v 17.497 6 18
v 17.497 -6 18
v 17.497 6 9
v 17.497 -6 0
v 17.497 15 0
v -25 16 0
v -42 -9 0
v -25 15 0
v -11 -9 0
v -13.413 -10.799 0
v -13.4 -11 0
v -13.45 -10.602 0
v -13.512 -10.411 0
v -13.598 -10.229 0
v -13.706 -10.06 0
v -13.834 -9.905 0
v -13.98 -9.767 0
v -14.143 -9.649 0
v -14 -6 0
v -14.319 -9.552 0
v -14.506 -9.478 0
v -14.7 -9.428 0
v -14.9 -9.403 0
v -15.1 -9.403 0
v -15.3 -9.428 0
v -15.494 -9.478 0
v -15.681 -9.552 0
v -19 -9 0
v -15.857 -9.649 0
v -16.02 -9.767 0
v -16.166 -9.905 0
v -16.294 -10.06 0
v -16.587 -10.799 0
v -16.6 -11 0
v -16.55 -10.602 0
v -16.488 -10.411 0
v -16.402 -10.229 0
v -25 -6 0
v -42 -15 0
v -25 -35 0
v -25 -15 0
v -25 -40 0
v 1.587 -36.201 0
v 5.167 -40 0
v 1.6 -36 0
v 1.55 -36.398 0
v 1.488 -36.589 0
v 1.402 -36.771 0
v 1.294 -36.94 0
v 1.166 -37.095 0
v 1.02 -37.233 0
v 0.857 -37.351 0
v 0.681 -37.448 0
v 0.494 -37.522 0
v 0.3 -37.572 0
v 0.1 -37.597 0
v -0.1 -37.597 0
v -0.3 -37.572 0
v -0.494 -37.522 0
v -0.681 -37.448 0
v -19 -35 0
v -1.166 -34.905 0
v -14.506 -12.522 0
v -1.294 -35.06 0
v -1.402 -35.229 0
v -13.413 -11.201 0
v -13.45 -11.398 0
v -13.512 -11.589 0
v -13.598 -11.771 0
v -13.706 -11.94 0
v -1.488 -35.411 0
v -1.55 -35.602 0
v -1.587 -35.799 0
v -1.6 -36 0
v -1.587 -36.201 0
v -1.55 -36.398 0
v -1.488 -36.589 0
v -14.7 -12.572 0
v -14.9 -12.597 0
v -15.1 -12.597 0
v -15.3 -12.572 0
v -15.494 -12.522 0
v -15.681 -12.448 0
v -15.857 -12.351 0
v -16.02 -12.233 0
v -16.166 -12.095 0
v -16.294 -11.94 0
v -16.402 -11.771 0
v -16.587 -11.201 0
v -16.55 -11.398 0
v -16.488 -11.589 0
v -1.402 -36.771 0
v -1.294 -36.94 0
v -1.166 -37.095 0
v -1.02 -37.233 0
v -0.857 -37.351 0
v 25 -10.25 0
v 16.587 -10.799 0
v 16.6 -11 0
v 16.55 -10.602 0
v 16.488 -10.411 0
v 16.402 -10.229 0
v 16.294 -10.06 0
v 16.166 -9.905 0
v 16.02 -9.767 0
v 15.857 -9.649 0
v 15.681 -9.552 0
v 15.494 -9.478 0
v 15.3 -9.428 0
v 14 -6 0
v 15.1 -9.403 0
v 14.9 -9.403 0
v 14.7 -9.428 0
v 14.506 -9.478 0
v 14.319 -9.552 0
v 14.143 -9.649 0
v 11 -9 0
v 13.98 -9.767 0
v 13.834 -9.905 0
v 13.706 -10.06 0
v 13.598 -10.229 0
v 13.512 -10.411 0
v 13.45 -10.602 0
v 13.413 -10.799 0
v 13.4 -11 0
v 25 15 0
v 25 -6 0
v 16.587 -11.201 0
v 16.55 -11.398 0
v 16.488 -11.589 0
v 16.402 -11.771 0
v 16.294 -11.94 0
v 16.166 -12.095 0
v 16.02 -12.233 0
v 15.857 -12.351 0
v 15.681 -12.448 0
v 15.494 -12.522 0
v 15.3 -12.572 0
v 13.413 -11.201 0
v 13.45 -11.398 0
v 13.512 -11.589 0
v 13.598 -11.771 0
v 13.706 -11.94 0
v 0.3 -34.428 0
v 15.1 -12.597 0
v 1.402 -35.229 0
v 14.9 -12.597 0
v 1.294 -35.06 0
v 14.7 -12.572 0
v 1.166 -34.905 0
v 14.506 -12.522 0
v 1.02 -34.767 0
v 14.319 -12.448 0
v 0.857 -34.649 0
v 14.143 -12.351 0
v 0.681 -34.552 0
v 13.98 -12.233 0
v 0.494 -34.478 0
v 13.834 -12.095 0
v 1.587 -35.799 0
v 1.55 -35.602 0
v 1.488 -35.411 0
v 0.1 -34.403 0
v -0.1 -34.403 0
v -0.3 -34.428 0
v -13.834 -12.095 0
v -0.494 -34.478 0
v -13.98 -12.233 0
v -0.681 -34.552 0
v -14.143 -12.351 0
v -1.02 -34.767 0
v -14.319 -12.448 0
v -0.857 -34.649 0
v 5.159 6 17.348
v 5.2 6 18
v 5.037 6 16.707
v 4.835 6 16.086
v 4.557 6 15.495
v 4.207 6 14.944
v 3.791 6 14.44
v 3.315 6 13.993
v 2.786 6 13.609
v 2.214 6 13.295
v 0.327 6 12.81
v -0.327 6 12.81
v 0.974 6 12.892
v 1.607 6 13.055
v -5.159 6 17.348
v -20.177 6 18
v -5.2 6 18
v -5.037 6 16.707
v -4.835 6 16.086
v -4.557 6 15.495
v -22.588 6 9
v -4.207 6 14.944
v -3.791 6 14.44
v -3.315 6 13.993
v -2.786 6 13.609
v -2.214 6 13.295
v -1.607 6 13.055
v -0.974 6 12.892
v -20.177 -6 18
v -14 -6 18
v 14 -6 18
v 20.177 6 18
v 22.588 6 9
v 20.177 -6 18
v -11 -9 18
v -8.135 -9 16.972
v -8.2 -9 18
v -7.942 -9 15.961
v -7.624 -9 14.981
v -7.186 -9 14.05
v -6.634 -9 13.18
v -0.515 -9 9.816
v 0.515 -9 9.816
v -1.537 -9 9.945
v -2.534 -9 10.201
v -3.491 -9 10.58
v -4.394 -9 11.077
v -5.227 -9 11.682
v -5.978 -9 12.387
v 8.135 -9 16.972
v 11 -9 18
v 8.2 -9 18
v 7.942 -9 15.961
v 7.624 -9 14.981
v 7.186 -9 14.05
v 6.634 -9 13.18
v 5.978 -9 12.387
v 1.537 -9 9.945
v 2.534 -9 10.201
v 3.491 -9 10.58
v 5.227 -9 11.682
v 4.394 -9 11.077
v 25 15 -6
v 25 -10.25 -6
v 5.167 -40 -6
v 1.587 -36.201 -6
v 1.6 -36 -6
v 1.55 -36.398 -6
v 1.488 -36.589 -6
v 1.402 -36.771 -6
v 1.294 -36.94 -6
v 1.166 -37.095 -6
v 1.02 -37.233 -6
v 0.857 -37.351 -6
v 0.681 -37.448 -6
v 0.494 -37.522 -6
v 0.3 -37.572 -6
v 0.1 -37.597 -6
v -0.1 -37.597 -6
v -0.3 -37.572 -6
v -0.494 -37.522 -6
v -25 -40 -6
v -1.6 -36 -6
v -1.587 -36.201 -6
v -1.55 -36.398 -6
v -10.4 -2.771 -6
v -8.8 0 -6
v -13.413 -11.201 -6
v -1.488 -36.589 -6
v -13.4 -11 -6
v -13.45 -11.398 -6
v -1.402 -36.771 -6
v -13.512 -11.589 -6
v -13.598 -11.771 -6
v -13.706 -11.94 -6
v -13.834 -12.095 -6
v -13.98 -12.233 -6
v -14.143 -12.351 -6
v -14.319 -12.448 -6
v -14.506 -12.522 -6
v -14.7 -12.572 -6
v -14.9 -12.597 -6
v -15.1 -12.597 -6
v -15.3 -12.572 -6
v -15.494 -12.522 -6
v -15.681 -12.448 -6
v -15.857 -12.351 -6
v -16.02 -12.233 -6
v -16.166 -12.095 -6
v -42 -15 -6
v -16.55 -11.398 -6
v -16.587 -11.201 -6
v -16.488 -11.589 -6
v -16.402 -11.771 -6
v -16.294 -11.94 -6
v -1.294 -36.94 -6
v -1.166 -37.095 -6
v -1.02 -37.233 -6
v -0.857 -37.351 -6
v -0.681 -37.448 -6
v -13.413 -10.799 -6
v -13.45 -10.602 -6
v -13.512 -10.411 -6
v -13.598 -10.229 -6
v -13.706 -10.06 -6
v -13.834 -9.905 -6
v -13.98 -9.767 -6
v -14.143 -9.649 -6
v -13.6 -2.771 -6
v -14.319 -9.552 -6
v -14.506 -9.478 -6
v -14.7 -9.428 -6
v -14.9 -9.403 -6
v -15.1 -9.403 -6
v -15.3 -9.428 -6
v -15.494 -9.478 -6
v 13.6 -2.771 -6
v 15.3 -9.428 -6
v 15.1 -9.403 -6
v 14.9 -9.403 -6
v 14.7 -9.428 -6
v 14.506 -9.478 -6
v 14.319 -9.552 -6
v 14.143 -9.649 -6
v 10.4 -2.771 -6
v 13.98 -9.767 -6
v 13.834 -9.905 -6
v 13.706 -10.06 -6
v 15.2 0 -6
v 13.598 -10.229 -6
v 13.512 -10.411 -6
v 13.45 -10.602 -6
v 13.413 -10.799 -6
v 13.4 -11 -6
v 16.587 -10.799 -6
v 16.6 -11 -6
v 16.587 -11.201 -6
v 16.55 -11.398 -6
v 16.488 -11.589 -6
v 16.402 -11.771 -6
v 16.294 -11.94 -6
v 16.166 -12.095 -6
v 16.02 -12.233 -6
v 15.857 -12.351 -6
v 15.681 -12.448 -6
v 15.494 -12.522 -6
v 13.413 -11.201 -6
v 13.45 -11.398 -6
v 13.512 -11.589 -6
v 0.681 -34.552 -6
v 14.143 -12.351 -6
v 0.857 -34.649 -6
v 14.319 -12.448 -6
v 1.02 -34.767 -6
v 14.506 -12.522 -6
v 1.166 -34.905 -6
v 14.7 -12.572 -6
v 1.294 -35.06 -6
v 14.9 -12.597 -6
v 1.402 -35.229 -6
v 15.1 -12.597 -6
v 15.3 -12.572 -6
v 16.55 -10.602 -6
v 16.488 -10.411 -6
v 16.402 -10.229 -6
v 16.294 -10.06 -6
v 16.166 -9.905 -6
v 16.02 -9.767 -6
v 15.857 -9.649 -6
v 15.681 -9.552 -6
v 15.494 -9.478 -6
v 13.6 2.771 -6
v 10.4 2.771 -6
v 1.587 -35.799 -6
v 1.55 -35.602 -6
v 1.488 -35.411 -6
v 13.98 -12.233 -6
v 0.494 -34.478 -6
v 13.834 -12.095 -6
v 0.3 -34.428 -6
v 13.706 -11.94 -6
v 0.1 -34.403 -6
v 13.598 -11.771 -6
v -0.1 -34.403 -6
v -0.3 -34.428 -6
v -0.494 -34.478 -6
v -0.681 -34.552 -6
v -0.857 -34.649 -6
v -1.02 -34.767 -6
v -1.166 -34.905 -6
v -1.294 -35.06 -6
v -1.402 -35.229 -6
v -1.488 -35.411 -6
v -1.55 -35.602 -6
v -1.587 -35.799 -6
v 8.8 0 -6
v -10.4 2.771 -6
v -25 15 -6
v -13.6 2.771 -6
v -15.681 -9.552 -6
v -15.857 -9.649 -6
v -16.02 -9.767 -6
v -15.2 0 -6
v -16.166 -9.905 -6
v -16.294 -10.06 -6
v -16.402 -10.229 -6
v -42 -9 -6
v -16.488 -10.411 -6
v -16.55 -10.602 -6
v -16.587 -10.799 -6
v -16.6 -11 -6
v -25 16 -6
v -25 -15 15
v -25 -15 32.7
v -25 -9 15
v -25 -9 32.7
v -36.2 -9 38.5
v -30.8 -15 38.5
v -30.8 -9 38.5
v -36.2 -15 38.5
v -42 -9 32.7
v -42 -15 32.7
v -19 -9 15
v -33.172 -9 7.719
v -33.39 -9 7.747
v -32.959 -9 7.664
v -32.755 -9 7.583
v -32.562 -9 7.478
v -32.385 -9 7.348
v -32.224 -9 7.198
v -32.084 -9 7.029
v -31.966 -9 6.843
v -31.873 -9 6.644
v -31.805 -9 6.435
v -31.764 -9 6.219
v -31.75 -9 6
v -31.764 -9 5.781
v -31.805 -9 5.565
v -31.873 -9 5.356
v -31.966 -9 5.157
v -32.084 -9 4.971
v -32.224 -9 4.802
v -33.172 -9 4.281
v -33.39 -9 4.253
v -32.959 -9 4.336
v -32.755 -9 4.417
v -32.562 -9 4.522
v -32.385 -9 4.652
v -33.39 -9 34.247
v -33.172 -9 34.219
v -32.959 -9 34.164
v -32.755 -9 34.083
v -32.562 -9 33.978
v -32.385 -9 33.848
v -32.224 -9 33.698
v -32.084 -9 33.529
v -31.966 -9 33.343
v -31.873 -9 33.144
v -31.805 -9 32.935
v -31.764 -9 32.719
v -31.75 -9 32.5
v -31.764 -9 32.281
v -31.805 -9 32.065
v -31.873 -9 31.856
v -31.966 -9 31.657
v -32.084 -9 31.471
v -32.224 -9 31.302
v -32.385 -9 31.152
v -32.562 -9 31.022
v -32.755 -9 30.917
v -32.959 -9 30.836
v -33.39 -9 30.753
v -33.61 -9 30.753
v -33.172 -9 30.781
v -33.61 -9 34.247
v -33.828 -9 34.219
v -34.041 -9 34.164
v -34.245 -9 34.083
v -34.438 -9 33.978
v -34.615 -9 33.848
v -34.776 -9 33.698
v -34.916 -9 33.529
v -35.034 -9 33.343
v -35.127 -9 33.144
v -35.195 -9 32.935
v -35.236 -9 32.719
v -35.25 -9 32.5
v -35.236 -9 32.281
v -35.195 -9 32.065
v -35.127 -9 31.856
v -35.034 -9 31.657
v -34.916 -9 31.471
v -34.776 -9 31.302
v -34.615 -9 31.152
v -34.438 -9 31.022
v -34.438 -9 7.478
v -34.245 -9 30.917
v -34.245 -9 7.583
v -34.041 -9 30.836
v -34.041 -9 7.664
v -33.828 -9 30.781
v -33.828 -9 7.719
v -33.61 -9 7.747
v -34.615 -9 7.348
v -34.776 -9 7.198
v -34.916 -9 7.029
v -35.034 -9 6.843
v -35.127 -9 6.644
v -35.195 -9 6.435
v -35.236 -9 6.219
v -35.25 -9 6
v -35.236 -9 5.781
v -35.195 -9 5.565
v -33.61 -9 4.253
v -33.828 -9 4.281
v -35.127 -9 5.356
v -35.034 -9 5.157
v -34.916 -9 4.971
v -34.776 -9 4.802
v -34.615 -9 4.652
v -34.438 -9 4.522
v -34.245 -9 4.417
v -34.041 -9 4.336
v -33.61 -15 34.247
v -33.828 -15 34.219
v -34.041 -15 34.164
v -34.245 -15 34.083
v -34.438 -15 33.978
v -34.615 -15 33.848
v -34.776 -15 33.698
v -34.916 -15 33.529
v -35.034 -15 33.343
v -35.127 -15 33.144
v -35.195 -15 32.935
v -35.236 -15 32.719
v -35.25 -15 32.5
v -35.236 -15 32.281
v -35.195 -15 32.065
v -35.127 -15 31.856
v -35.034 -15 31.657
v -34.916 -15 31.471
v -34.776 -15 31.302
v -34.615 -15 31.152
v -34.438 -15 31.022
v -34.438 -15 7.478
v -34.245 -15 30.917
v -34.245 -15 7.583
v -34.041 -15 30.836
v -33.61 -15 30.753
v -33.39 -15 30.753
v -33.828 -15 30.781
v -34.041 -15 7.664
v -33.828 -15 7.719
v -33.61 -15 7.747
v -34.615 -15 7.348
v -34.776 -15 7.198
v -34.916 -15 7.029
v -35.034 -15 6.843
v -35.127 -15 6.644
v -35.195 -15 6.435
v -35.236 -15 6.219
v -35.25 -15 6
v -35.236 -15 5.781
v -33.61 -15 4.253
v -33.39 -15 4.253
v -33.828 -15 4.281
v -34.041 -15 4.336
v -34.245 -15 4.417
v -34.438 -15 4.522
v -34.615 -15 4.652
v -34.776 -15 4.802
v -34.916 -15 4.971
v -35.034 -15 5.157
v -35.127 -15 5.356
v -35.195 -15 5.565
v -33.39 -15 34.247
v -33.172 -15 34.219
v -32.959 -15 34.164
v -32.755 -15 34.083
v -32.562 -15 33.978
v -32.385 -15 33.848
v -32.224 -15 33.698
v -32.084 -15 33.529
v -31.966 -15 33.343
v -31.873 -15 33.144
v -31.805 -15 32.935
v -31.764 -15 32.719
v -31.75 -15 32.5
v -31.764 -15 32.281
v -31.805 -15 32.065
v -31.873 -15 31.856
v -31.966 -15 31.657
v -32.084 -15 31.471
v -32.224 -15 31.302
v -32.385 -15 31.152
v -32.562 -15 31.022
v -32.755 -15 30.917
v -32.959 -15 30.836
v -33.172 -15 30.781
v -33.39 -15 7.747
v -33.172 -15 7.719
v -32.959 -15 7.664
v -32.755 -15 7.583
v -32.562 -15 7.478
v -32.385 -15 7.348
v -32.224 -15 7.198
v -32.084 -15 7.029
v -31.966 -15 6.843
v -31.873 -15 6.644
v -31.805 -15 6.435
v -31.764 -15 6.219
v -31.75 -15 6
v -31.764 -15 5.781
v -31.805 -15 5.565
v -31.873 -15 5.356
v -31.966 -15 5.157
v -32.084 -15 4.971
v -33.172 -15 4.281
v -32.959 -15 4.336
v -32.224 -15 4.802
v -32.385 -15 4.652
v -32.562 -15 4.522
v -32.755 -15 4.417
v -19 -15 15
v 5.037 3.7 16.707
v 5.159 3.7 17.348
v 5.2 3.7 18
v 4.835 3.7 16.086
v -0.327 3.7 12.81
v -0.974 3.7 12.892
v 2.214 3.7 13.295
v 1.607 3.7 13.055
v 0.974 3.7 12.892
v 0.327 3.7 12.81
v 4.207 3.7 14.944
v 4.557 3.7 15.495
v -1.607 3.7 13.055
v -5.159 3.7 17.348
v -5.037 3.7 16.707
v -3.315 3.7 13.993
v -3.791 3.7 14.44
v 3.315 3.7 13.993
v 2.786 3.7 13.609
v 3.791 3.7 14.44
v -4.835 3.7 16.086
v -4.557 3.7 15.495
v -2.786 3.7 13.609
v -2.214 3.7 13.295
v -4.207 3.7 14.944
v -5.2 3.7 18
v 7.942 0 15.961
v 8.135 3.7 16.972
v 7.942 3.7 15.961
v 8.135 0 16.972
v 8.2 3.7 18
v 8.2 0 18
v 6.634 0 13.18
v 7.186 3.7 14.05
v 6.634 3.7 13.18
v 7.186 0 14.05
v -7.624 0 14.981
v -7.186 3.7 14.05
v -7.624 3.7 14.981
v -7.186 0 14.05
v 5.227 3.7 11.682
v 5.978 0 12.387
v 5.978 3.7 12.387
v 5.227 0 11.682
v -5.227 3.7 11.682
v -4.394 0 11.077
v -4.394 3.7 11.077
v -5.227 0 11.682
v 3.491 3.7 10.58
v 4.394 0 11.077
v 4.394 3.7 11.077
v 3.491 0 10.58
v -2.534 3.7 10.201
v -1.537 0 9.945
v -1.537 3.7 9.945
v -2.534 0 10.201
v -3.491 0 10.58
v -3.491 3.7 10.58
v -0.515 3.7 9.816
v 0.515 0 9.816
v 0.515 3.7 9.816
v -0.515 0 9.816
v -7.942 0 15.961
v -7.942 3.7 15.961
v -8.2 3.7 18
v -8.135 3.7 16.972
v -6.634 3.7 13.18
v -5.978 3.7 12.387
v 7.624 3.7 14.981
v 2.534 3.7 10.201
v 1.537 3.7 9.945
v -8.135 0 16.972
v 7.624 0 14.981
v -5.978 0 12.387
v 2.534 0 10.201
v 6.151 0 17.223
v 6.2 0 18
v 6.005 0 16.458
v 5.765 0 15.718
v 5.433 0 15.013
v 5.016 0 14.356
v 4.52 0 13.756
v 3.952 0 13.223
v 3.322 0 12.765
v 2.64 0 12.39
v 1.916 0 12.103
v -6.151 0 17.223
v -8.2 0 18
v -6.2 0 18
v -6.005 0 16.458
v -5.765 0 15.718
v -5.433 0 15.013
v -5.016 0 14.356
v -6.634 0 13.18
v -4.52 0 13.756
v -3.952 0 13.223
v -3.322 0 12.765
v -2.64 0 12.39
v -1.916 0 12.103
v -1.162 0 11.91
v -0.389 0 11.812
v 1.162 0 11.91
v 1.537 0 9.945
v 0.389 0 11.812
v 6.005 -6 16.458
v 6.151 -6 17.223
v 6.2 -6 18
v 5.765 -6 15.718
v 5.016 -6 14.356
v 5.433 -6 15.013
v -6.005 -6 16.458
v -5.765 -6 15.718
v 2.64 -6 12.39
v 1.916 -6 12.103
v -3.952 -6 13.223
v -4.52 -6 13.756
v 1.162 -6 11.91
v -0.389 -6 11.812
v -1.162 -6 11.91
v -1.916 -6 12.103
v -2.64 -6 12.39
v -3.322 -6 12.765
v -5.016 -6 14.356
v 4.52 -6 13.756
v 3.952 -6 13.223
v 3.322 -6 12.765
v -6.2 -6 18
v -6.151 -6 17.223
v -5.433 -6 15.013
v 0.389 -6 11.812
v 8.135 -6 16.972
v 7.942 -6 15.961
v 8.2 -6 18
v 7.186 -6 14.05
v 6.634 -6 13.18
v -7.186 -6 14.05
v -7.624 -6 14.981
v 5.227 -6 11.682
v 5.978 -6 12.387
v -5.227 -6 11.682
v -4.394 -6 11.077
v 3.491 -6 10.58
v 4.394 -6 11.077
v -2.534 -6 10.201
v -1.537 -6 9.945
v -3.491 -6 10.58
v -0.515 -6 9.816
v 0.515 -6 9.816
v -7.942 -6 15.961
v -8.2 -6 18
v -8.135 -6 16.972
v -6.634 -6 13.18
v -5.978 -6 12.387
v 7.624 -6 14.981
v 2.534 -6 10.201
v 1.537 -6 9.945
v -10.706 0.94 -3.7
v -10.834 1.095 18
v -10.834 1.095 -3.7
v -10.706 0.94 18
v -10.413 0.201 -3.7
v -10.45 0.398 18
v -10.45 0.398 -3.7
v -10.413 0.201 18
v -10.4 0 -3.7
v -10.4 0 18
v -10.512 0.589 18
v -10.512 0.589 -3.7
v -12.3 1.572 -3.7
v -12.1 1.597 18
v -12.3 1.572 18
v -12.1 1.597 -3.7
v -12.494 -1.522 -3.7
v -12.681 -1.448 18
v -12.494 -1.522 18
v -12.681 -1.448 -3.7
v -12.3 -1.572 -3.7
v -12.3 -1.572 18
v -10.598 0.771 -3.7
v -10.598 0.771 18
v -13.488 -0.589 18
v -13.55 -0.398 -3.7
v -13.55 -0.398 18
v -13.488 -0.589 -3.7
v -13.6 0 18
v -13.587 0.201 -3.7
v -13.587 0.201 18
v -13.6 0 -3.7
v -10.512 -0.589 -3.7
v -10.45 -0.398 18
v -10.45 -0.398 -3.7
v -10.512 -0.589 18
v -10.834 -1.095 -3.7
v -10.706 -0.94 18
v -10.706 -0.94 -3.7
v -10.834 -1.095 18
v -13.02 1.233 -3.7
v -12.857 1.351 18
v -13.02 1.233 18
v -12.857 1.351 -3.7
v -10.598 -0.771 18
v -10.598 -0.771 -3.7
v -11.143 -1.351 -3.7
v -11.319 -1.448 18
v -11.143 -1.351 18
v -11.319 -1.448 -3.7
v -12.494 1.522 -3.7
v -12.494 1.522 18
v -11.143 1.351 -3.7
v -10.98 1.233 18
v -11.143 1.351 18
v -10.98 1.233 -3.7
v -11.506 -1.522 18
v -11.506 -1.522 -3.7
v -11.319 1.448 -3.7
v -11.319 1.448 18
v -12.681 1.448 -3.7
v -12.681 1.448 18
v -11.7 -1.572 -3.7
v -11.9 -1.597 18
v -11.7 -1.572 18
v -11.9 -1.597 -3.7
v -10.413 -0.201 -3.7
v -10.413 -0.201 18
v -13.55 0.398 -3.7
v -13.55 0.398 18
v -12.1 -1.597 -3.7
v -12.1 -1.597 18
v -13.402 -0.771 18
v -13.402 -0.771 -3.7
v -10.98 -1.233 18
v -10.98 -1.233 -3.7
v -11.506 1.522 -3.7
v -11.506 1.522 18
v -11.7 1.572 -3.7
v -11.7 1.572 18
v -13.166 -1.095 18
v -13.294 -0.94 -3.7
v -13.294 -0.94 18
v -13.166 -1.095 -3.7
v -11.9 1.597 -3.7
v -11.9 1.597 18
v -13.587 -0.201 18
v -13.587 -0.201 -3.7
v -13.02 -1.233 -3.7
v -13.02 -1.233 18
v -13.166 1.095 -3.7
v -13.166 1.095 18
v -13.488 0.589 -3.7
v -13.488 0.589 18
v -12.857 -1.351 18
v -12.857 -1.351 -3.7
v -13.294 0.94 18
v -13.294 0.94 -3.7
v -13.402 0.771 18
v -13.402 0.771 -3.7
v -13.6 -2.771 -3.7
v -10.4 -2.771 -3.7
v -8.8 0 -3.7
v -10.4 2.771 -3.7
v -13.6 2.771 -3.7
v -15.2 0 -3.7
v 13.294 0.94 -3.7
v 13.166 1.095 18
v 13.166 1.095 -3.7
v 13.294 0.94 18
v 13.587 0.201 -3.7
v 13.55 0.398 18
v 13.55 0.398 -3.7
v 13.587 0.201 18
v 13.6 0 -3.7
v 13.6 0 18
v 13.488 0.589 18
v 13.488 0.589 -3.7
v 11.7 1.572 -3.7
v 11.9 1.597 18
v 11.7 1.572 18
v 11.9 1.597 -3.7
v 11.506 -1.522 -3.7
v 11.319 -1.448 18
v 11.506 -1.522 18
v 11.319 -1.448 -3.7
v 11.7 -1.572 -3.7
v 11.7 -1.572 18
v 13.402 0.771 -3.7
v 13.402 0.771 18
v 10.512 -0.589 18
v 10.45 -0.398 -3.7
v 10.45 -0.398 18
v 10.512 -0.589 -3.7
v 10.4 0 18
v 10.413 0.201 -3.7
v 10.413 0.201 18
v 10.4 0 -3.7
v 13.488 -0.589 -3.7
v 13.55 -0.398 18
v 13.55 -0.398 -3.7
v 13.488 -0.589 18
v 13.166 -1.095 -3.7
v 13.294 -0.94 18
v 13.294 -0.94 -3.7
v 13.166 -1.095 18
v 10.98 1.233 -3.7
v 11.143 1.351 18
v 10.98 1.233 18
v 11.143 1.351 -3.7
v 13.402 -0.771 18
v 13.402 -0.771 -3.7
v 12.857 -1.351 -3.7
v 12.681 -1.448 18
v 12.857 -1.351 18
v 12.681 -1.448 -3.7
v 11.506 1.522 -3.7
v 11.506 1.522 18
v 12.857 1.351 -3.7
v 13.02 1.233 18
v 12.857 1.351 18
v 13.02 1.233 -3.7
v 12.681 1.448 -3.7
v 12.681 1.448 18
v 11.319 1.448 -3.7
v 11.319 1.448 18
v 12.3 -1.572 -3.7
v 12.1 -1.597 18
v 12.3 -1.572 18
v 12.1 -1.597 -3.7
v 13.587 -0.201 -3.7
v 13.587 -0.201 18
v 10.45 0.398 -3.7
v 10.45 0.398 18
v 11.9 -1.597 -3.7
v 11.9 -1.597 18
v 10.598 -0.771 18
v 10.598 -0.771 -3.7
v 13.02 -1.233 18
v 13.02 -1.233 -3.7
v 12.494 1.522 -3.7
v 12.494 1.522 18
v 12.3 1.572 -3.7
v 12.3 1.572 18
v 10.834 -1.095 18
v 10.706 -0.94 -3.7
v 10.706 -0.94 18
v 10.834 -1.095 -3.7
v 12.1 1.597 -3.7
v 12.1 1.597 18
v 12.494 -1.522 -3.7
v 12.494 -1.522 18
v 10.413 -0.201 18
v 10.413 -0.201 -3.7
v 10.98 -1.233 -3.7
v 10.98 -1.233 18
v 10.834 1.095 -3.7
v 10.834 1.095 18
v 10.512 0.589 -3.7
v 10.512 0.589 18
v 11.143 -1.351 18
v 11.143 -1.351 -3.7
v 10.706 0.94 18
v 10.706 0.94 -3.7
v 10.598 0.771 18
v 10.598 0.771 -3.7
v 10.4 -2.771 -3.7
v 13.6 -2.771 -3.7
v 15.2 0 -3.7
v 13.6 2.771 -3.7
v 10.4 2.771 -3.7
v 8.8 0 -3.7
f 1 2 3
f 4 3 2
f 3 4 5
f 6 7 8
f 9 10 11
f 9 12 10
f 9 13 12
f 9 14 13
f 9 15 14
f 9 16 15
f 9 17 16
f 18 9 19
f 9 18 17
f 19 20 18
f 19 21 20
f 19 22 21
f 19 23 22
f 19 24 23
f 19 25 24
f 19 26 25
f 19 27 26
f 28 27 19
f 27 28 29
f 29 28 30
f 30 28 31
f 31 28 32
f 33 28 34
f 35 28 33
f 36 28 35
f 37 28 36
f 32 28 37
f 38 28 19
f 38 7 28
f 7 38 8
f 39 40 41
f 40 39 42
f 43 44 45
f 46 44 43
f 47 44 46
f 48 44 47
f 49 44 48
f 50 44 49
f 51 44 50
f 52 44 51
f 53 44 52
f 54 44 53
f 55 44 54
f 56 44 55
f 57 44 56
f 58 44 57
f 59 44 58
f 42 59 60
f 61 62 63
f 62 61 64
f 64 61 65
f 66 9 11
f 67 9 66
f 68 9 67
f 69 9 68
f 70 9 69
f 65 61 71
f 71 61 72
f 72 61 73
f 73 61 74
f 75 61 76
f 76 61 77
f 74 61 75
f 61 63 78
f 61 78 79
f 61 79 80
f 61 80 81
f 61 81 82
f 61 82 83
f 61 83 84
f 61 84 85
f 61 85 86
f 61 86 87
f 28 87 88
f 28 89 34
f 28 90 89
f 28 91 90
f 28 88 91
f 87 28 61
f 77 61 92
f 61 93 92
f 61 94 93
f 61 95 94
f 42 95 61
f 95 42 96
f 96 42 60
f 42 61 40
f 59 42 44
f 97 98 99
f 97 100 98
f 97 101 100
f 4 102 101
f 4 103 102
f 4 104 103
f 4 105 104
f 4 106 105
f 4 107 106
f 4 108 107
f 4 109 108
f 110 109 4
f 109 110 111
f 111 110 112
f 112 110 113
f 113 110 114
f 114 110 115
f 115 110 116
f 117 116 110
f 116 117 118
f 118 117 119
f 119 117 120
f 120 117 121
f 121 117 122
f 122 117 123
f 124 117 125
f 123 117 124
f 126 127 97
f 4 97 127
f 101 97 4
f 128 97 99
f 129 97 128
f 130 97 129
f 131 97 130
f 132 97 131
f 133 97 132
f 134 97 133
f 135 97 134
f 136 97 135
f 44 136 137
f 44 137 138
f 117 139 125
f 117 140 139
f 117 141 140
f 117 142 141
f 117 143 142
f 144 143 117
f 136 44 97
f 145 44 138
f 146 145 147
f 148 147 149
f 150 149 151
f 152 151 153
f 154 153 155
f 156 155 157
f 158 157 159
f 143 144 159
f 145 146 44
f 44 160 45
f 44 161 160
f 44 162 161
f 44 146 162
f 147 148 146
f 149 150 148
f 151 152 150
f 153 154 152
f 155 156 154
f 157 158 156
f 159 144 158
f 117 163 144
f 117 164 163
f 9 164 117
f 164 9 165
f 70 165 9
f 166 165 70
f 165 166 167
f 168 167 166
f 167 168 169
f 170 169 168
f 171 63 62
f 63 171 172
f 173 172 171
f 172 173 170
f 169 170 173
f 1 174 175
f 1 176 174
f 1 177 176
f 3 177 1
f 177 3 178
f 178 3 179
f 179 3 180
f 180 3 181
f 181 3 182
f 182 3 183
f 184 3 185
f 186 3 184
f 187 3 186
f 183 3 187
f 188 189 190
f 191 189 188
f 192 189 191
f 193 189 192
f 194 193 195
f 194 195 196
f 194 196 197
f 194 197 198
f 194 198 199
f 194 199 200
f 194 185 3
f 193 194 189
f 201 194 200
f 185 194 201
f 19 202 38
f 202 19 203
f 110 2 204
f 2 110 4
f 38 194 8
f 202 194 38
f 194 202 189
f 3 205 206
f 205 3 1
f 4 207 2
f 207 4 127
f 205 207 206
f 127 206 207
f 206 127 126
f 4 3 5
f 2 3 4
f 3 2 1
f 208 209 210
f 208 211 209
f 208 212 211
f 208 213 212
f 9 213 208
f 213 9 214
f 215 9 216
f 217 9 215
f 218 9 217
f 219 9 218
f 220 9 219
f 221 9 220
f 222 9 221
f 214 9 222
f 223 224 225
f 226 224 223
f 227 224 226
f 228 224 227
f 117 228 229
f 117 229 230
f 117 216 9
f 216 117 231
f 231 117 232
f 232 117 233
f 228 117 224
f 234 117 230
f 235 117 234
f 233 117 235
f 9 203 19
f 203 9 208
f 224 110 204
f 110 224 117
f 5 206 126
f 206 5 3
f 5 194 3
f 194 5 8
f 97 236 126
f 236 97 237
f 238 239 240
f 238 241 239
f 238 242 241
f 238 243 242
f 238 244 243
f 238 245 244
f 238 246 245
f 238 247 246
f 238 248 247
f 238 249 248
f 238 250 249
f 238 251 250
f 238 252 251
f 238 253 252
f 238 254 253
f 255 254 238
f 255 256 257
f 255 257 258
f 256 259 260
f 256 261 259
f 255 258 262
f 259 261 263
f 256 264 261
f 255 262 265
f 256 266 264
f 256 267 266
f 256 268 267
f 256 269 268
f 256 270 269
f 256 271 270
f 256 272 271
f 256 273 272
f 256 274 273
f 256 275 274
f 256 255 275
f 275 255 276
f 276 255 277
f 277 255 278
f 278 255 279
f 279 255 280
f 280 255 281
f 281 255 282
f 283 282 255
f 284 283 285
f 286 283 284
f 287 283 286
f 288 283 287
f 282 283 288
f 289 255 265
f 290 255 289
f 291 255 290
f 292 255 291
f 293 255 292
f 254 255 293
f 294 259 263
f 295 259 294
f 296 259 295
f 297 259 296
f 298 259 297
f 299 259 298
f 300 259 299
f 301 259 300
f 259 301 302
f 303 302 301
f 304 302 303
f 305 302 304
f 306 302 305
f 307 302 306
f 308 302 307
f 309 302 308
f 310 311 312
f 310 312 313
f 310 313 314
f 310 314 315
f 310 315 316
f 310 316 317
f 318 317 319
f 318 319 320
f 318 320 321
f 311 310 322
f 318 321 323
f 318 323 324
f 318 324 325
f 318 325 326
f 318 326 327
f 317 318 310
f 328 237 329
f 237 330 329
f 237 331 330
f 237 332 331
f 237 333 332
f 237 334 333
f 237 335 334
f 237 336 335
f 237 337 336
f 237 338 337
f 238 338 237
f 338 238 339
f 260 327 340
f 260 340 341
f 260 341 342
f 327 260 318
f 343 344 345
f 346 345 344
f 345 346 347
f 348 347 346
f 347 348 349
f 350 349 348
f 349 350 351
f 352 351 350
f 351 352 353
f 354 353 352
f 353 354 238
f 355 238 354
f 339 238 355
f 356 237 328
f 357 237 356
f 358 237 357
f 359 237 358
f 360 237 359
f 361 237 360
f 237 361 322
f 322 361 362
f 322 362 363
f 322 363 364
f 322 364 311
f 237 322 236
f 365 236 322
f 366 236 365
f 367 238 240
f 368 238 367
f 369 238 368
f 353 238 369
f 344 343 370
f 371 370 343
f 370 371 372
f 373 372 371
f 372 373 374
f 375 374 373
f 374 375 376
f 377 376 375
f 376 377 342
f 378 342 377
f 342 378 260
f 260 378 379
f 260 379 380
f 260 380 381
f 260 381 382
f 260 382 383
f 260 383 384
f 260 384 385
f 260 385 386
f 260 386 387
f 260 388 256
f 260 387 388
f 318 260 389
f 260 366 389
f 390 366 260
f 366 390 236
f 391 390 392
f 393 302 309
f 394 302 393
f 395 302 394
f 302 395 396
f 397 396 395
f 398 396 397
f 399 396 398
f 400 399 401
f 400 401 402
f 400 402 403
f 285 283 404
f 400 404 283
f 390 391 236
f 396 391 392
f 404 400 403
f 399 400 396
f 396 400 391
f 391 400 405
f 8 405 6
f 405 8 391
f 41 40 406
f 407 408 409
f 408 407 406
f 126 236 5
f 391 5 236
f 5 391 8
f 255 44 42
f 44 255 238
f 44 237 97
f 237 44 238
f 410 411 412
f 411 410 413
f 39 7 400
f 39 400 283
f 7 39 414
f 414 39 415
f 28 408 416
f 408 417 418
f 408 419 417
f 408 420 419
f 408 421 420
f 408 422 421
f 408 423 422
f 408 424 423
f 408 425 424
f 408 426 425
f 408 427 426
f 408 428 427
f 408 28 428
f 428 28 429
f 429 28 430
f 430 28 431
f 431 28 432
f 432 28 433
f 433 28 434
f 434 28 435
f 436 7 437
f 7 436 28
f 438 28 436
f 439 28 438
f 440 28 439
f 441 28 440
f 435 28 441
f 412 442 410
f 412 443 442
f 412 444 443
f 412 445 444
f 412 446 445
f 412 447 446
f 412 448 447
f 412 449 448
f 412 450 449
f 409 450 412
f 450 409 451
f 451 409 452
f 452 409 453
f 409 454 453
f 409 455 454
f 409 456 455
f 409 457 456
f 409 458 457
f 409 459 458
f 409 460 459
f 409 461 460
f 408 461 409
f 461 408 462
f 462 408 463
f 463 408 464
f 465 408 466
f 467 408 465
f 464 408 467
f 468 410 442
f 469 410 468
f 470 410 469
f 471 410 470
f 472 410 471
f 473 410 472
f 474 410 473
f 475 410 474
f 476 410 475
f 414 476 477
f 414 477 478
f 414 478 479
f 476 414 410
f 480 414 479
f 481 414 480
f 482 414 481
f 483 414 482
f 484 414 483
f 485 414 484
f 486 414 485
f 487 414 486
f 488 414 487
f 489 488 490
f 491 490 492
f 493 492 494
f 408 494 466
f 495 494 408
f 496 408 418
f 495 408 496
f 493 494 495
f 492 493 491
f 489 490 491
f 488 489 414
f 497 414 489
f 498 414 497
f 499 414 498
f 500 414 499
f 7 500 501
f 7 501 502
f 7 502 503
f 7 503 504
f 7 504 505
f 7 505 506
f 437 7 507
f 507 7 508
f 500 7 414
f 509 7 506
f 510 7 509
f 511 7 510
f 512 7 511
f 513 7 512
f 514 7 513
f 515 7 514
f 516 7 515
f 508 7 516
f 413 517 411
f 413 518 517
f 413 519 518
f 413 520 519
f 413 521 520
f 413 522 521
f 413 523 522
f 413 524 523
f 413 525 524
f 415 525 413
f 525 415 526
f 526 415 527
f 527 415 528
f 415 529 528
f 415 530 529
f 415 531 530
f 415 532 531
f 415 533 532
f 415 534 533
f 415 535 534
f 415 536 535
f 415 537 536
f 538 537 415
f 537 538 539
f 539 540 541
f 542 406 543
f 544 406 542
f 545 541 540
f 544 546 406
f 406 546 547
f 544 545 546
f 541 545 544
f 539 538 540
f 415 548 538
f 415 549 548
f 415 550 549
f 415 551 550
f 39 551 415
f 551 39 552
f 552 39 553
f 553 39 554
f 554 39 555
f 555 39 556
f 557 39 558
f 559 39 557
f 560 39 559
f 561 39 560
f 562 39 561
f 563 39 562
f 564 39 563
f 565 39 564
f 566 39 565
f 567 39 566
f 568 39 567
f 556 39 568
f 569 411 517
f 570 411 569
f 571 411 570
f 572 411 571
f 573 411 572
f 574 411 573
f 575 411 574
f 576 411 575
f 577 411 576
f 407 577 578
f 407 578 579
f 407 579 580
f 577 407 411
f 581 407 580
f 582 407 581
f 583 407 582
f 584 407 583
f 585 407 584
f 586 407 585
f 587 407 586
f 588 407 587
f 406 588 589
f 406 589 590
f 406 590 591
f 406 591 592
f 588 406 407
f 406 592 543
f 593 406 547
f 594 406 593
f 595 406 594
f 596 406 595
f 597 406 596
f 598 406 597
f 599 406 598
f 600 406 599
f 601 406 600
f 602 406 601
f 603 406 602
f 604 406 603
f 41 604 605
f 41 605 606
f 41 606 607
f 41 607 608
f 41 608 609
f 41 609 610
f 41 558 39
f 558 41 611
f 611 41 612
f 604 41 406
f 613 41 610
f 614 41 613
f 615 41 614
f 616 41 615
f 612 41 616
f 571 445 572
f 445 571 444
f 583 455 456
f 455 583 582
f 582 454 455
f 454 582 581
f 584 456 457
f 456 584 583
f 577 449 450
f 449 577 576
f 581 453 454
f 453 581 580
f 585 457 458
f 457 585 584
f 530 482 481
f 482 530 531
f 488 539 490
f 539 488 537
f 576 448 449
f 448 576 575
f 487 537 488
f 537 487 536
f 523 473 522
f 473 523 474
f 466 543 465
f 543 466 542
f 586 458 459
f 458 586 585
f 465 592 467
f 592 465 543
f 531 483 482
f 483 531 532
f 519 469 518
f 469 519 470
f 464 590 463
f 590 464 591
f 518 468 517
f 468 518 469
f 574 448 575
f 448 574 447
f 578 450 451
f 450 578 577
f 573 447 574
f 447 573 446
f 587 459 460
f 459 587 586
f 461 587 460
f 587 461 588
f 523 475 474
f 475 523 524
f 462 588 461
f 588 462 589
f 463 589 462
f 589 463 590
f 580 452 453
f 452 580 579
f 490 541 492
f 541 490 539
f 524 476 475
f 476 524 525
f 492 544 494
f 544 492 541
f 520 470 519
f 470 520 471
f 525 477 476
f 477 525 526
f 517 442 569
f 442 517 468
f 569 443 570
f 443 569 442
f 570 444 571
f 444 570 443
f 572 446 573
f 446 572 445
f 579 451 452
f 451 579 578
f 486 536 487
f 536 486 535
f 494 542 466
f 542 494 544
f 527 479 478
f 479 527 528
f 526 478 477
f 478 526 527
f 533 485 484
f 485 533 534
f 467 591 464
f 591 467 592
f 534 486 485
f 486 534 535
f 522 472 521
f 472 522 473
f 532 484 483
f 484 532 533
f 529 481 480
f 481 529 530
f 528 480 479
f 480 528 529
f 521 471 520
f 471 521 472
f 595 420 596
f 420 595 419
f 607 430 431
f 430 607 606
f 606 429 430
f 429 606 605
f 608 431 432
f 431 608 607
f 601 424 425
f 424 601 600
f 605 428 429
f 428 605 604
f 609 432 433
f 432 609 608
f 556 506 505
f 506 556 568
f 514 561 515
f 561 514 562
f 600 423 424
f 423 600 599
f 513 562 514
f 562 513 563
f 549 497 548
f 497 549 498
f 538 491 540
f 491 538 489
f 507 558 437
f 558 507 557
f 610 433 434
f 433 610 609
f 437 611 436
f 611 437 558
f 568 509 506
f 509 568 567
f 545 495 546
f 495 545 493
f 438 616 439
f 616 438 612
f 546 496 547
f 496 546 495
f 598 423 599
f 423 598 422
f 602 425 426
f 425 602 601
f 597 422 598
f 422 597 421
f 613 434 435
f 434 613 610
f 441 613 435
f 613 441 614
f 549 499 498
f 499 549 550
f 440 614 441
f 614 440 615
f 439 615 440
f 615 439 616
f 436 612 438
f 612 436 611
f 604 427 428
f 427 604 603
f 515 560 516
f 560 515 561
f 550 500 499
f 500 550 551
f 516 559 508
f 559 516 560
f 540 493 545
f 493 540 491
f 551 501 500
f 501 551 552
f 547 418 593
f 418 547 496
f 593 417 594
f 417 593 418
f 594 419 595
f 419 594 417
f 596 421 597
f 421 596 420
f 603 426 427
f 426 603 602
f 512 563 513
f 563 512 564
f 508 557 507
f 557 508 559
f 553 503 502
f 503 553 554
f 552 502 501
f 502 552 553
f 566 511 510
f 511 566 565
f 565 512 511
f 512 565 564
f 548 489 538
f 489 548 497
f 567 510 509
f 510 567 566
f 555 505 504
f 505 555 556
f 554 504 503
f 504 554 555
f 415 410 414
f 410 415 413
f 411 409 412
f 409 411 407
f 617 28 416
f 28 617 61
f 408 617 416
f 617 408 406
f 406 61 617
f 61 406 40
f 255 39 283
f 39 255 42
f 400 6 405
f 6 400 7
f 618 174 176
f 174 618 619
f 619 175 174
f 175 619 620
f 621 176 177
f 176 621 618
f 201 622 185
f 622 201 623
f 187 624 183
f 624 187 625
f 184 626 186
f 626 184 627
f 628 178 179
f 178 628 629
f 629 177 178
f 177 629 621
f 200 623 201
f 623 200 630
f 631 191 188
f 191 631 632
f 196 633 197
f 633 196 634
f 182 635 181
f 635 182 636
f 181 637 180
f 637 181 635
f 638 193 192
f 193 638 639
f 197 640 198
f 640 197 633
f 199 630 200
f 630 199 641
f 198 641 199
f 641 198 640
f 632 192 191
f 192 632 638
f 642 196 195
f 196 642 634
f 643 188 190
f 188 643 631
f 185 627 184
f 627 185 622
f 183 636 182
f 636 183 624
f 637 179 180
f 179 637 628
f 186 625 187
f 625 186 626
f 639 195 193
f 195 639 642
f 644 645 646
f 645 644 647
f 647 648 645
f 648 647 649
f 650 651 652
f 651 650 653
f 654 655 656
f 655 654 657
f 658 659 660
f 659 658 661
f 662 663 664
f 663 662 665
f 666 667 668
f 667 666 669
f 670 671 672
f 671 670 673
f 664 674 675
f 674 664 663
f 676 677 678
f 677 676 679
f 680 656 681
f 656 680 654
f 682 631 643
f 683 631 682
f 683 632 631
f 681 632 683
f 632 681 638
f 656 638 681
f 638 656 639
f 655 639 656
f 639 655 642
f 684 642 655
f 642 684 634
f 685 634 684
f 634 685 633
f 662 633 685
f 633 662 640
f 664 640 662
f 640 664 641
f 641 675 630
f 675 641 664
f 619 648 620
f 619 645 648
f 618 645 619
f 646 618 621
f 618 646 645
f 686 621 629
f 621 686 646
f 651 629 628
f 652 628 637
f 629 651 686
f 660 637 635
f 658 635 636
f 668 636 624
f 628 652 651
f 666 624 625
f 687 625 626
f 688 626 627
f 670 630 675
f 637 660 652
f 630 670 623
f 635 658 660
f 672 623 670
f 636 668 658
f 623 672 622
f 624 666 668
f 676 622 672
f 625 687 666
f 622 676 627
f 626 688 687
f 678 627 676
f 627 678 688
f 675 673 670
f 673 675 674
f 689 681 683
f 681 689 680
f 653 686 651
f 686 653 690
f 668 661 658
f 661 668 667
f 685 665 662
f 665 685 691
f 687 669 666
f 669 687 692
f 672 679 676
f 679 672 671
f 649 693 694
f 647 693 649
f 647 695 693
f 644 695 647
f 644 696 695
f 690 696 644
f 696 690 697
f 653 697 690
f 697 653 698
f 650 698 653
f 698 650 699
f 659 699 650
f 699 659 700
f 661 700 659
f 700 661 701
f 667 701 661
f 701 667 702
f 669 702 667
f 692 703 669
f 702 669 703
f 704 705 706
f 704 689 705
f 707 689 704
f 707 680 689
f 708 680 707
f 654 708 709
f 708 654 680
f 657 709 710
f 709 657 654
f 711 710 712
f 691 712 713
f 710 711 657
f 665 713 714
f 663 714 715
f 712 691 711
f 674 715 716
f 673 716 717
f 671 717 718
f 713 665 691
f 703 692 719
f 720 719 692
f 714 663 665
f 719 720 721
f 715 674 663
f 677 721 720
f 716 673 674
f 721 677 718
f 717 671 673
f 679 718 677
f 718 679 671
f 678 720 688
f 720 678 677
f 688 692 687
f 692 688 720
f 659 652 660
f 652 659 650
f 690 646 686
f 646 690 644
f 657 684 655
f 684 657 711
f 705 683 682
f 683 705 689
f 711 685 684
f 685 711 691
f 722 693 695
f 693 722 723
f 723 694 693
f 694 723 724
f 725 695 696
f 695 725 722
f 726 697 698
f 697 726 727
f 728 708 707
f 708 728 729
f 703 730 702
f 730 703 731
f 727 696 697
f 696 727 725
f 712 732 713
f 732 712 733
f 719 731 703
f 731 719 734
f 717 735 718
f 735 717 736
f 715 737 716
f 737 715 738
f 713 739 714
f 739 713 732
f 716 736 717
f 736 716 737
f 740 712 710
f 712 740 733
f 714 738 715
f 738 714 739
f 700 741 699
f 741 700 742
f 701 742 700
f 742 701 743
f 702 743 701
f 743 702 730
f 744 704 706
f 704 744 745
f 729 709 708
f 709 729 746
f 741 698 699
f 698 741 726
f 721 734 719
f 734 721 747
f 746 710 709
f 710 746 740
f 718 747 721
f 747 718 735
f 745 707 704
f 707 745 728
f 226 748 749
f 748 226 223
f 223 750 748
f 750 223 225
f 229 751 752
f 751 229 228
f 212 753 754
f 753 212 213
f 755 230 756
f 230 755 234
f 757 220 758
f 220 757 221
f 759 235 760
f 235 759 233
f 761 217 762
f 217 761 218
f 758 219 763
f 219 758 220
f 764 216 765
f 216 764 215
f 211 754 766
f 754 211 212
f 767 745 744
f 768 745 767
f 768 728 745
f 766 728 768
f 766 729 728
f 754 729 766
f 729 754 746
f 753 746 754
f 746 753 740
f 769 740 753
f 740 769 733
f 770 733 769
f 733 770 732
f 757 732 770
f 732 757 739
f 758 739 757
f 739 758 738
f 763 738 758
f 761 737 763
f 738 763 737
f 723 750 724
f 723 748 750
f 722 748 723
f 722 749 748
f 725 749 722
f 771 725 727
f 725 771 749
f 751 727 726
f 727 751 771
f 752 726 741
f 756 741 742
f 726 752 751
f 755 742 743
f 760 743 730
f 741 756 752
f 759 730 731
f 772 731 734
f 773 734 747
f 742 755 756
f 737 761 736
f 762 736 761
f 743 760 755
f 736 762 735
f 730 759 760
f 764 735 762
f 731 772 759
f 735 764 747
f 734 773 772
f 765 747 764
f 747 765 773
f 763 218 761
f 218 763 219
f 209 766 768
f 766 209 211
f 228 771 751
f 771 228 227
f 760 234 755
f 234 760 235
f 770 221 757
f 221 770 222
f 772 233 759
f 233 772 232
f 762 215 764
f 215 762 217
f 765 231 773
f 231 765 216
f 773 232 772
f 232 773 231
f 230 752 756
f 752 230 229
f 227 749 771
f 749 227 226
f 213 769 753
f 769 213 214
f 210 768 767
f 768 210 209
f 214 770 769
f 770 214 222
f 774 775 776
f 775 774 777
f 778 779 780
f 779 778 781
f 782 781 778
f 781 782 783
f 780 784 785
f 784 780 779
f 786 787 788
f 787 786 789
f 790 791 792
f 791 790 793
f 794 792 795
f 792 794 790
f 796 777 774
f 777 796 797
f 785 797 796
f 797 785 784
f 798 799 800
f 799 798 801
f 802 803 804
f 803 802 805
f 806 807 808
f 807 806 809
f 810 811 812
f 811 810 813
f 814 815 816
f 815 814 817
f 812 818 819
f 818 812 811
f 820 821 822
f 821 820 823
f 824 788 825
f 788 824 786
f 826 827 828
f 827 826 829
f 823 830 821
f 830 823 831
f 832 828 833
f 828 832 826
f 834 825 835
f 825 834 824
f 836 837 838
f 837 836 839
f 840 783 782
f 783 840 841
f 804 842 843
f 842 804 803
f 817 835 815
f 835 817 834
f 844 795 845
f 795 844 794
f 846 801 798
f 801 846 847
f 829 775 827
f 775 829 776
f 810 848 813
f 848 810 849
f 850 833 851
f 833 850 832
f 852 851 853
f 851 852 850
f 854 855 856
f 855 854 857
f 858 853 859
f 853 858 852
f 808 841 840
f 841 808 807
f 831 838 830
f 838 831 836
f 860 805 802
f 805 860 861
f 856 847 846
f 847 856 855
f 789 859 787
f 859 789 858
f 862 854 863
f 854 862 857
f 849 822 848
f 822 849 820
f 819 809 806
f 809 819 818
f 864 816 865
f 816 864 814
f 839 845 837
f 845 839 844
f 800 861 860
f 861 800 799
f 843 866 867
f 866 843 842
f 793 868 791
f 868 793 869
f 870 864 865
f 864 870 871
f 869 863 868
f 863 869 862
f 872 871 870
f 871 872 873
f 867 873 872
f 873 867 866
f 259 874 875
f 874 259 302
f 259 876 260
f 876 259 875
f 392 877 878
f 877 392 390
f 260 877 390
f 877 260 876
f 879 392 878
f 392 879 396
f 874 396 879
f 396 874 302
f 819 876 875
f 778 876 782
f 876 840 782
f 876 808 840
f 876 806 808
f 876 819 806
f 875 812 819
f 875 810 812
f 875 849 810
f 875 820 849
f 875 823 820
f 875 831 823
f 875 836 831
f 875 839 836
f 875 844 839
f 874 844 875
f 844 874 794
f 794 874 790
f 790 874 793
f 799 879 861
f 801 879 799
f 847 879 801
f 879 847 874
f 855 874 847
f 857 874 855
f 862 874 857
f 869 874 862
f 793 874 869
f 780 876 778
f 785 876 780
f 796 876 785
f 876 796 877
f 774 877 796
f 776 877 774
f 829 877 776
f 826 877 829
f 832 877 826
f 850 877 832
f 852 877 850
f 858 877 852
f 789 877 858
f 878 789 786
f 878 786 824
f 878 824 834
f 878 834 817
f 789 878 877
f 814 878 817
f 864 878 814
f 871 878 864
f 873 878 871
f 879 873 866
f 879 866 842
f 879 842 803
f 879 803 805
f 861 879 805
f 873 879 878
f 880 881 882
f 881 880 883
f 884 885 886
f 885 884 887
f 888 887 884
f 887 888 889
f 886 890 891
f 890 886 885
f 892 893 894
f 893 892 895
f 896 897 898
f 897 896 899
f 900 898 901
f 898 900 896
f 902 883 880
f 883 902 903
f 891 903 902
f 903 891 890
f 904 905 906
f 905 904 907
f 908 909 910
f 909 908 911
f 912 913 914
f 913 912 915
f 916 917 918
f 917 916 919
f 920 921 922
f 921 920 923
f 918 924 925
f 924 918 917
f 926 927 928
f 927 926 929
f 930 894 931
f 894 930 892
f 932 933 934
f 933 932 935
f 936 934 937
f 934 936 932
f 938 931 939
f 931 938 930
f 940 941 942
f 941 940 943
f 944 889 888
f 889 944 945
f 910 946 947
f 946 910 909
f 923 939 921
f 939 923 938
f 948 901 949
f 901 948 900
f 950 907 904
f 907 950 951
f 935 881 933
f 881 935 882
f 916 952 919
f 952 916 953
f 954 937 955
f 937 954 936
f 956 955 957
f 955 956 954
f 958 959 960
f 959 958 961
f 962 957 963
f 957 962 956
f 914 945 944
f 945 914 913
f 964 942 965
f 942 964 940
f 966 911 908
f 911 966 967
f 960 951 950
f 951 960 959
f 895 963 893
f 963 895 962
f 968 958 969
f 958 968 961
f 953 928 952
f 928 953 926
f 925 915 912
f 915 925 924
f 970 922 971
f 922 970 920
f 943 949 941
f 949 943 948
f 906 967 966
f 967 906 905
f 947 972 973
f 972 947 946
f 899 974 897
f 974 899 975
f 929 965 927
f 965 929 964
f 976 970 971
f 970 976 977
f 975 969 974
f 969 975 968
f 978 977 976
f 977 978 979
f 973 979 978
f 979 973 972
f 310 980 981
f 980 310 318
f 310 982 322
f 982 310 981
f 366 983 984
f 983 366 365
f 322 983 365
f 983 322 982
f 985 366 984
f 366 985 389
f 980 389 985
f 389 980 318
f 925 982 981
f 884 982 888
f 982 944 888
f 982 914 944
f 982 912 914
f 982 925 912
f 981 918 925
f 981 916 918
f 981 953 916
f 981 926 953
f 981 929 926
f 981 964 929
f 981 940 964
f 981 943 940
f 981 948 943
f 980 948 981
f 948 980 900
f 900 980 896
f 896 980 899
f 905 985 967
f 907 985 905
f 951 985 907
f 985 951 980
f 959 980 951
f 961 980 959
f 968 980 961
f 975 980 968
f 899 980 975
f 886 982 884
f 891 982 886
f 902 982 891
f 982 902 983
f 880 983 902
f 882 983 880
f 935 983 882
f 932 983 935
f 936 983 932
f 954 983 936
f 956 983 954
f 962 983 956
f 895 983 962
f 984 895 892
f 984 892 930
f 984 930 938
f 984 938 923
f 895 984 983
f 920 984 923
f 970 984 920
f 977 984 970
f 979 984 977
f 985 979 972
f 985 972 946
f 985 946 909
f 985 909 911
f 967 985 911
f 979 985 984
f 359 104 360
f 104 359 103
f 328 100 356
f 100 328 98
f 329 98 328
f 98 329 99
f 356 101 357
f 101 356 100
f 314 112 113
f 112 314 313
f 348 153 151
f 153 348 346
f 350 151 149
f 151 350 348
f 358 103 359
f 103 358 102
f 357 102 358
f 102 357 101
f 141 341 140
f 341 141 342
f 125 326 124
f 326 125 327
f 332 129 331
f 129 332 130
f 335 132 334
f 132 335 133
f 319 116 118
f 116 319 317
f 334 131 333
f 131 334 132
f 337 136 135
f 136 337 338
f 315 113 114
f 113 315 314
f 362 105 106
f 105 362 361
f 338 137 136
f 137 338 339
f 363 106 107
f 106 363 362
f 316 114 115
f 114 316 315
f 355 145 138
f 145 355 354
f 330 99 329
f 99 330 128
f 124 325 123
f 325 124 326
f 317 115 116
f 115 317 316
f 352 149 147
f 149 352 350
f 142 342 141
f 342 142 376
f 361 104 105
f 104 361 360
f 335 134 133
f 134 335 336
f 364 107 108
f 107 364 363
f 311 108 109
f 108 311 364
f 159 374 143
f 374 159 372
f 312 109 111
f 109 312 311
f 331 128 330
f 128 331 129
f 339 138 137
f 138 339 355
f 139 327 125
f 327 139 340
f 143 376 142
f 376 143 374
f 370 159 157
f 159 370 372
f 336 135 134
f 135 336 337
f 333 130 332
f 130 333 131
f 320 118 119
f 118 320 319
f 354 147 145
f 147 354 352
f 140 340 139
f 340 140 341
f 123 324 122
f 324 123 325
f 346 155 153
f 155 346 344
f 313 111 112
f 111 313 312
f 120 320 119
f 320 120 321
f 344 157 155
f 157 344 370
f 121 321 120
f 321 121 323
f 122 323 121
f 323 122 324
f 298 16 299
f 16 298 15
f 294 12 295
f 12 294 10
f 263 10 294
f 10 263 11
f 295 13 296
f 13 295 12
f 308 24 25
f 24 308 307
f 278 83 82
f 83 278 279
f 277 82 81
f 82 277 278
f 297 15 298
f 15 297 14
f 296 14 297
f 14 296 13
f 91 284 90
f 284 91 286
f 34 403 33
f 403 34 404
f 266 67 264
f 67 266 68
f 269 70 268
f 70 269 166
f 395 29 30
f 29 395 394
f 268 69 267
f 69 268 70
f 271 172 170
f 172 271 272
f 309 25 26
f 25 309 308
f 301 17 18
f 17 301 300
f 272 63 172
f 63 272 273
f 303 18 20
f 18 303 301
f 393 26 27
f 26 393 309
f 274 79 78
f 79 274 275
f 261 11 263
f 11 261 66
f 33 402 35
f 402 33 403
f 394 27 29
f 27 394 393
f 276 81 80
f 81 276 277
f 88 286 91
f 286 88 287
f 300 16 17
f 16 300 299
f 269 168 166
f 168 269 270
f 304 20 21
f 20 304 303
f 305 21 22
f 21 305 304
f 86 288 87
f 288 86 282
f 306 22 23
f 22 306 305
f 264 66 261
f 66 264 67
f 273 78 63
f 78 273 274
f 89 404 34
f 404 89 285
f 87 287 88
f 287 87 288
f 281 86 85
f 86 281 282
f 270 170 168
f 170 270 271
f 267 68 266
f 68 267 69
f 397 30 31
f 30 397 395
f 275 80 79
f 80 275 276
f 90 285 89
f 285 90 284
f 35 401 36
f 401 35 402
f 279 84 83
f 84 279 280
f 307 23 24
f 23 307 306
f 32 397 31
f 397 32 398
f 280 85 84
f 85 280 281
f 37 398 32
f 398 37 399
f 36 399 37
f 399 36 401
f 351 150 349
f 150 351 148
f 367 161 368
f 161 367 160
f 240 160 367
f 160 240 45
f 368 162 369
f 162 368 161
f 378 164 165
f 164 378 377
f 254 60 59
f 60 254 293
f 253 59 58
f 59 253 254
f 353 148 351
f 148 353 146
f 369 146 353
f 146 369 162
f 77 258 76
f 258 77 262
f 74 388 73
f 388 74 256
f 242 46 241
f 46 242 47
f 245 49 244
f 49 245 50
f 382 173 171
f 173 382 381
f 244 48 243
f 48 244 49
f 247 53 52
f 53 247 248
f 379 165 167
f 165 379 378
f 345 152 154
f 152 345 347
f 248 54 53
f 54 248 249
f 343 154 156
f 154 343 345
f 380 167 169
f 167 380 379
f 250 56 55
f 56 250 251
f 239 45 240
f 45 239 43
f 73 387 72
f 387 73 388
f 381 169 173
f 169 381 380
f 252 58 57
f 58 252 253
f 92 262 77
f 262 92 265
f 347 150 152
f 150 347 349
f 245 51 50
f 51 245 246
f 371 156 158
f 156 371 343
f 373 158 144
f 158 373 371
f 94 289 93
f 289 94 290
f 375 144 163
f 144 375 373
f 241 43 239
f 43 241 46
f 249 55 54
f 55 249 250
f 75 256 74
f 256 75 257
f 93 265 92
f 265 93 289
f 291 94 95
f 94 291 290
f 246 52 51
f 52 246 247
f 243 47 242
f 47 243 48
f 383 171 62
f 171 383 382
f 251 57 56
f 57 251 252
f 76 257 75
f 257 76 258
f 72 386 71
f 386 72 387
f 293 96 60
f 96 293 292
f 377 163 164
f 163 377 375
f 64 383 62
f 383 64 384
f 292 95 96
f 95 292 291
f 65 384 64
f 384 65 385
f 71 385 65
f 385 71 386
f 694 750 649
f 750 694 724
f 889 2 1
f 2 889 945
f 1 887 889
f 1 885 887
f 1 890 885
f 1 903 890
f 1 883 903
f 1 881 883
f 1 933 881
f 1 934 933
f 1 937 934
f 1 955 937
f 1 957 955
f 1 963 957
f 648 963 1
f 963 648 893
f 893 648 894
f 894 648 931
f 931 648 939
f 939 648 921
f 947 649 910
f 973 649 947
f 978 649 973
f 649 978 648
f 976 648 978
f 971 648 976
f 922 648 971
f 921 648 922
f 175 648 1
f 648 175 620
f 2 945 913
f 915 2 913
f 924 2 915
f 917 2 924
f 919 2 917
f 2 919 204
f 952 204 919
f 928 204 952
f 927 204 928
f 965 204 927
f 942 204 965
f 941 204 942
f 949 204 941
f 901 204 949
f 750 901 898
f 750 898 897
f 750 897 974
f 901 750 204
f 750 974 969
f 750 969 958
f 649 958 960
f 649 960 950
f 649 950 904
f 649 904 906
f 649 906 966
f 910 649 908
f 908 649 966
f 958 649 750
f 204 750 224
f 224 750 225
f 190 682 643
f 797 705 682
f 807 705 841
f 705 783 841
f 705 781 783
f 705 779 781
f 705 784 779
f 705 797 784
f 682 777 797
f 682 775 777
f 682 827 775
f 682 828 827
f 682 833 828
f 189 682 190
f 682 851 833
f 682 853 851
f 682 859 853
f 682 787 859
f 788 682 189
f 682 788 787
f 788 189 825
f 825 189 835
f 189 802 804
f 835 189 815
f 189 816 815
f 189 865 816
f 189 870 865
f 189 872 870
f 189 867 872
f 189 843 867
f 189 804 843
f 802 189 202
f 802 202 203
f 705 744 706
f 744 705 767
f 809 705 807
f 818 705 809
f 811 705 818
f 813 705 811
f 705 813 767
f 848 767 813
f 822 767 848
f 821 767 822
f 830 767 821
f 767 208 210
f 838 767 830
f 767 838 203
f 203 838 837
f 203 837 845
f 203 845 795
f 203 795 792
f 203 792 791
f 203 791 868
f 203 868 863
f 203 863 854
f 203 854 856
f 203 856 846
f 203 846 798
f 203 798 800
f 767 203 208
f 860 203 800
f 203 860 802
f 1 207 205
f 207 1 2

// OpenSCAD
//head
include <MCAD/nuts_and_bolts.scad>;
$fn=50;
mode=1; //0-full 1-base part 2-clamp
extruder=0;  // 0 - model 1-additivities
oversize=0.2;
hole_height=18;
bltouch_hole=3.5;
bltouch_w=11+6;
bltouch_l=26.5+12;
bltouch_dist=14.4+bltouch_hole;
//subs
module prism(l, w, h) {
	translate([0, l, 0]) rotate( a= [90, 0, 0]) 
	linear_extrude(height = l) polygon(points = [
		[0, 0],
		[w, 0],
		[0, h]
	], paths=[[0,1,2,0]]);
}
module trapeze(w1,w2,d,h){
    down=min(w1,w2);
    low=abs(w1-w2)/2;
    translate([down/-2,d/-2,0]){
        cube([down,d,h]);
        prism(d,-low,h);
    }
    translate([down/2,d/-2,0])prism(d,low,h);
}

//hotend
module head_hole(cap=5){
    translate([0,0,3+6+3.7-0.1])cylinder(5,r=cap+oversize);
    translate([0,0,3+6])cylinder(3.7,r=8+oversize);
    translate([0,0,3-0.1])cylinder(6.0+0.2,r=6+oversize);
    translate([0,0,-0.1])cylinder(3.0+0.1,r=8+oversize);
}
module detector_clamp(){
    plate=26;
    translate([0,25,6])cube([6,6,15]);
    //translate([-3,0,plate])prism(6,6,6);
    //translate([6,25,6])prism(6,10,15);
    translate([0,25,6])rotate([0,0,-90,0])prism(6,20,15);
    translate([0,25,0])rotate([90,0,0])prism(6,-bltouch_w,25);
    translate([0,25+6,0])rotate([90,0,180])prism(6,bltouch_w,25);
    // CLAMP
    translate([-bltouch_w,25,0])difference(){
        cube([bltouch_w,6,6+bltouch_l]);
        //bltouch
        translate([bltouch_w/2,-0.1,bltouch_l])rotate([-90,0,0])cylinder(6.2,d=bltouch_hole);
        translate([bltouch_w/2,-0.1,12])rotate([-90,0,0])cylinder(6.2,d=bltouch_hole);
        
        //side cuts        
        translate([-0.1,-0.1,6+bltouch_l+0.1])rotate([0,90,0])prism(6.2,6,6);
        translate([bltouch_w+0.1,-0.1,6+bltouch_l+0.1])rotate([0,180,0])prism(6.2,6,6);
    }
}
module full (){
    h=28;
    w=50;
    base=11;
    plate=55;
difference(){
    union(){
        trapeze(w,w-2*h*tan(15),12,h);
        translate([0,12/-2,h/2])rotate([90,0,0])trapeze(22+3*2,22,h,3);
        translate([0,6,0])
            intersection(){
                rotate([0,0,90])translate([0,-w/2,0])prism(w,9,9);
                translate([0,9/2,0])trapeze(w,w-2*h*tan(15),9,h);
            }
        //plate
        translate([-w/2,-plate+9+6,-6])
         {
          difference(){
            cube([w,plate,6]);
            translate([w+0.1,-0.1,-0.1])rotate([90,0,180])prism(6.2,20,30);
          }
          detector_clamp();
        }
    }
    translate([0,-9,hole_height])rotate([-90,0,0])head_hole(5);
    
    for (s=[-12,12]){
        translate([s,0,-6-0.1]){ cylinder(h+6,r=1.6); nutHole(3); }
        translate([s,0,h-3])cylinder(3.1,r=2.75);
    }
    //base holes
    translate([0,-base,0])
    {
        translate([15,0,-6-0.1])cylinder(6.2,r=1.6);
        translate([-15,0,-6-0.1])cylinder(6.2,r=1.6);
        translate([0,-25,-6-0.1])cylinder(6.2,r=1.6);
    }
    
}
}

if (mode==0)
    full();
else
if (mode==1)
difference(){
    full();
    translate([-22,-10,hole_height])cube([60,20,hole_height]);
}
else
if (mode==2){ translate([0,0,-hole_height])intersection(){
    full();
    translate([-30,-10,hole_height])cube([60,20,hole_height]);
}
}
if (extruder==1)
	translate([0,0,hole_height]){
	translate([-0,-60,0])
	rotate([0,-90,0])
	translate([-8.7,0,-15.85])import("E3D V6 1.75 Uni model.STL", convexity=3);

	translate([0,-25,0])
	rotate([90,-90,0])
	translate([15.9,-2.5,-25])scale(0.85)import("E3D_Duct_wo_Plate.stl", convexity=3);

	translate([5,-29.5,13])rotate([90,-90,0])
	mirror()rotate([0,32.5,0])
	translate([2,3,-35-15])import("E3D_Fan_Nozzle_v2.stl", convexity=3);
}
